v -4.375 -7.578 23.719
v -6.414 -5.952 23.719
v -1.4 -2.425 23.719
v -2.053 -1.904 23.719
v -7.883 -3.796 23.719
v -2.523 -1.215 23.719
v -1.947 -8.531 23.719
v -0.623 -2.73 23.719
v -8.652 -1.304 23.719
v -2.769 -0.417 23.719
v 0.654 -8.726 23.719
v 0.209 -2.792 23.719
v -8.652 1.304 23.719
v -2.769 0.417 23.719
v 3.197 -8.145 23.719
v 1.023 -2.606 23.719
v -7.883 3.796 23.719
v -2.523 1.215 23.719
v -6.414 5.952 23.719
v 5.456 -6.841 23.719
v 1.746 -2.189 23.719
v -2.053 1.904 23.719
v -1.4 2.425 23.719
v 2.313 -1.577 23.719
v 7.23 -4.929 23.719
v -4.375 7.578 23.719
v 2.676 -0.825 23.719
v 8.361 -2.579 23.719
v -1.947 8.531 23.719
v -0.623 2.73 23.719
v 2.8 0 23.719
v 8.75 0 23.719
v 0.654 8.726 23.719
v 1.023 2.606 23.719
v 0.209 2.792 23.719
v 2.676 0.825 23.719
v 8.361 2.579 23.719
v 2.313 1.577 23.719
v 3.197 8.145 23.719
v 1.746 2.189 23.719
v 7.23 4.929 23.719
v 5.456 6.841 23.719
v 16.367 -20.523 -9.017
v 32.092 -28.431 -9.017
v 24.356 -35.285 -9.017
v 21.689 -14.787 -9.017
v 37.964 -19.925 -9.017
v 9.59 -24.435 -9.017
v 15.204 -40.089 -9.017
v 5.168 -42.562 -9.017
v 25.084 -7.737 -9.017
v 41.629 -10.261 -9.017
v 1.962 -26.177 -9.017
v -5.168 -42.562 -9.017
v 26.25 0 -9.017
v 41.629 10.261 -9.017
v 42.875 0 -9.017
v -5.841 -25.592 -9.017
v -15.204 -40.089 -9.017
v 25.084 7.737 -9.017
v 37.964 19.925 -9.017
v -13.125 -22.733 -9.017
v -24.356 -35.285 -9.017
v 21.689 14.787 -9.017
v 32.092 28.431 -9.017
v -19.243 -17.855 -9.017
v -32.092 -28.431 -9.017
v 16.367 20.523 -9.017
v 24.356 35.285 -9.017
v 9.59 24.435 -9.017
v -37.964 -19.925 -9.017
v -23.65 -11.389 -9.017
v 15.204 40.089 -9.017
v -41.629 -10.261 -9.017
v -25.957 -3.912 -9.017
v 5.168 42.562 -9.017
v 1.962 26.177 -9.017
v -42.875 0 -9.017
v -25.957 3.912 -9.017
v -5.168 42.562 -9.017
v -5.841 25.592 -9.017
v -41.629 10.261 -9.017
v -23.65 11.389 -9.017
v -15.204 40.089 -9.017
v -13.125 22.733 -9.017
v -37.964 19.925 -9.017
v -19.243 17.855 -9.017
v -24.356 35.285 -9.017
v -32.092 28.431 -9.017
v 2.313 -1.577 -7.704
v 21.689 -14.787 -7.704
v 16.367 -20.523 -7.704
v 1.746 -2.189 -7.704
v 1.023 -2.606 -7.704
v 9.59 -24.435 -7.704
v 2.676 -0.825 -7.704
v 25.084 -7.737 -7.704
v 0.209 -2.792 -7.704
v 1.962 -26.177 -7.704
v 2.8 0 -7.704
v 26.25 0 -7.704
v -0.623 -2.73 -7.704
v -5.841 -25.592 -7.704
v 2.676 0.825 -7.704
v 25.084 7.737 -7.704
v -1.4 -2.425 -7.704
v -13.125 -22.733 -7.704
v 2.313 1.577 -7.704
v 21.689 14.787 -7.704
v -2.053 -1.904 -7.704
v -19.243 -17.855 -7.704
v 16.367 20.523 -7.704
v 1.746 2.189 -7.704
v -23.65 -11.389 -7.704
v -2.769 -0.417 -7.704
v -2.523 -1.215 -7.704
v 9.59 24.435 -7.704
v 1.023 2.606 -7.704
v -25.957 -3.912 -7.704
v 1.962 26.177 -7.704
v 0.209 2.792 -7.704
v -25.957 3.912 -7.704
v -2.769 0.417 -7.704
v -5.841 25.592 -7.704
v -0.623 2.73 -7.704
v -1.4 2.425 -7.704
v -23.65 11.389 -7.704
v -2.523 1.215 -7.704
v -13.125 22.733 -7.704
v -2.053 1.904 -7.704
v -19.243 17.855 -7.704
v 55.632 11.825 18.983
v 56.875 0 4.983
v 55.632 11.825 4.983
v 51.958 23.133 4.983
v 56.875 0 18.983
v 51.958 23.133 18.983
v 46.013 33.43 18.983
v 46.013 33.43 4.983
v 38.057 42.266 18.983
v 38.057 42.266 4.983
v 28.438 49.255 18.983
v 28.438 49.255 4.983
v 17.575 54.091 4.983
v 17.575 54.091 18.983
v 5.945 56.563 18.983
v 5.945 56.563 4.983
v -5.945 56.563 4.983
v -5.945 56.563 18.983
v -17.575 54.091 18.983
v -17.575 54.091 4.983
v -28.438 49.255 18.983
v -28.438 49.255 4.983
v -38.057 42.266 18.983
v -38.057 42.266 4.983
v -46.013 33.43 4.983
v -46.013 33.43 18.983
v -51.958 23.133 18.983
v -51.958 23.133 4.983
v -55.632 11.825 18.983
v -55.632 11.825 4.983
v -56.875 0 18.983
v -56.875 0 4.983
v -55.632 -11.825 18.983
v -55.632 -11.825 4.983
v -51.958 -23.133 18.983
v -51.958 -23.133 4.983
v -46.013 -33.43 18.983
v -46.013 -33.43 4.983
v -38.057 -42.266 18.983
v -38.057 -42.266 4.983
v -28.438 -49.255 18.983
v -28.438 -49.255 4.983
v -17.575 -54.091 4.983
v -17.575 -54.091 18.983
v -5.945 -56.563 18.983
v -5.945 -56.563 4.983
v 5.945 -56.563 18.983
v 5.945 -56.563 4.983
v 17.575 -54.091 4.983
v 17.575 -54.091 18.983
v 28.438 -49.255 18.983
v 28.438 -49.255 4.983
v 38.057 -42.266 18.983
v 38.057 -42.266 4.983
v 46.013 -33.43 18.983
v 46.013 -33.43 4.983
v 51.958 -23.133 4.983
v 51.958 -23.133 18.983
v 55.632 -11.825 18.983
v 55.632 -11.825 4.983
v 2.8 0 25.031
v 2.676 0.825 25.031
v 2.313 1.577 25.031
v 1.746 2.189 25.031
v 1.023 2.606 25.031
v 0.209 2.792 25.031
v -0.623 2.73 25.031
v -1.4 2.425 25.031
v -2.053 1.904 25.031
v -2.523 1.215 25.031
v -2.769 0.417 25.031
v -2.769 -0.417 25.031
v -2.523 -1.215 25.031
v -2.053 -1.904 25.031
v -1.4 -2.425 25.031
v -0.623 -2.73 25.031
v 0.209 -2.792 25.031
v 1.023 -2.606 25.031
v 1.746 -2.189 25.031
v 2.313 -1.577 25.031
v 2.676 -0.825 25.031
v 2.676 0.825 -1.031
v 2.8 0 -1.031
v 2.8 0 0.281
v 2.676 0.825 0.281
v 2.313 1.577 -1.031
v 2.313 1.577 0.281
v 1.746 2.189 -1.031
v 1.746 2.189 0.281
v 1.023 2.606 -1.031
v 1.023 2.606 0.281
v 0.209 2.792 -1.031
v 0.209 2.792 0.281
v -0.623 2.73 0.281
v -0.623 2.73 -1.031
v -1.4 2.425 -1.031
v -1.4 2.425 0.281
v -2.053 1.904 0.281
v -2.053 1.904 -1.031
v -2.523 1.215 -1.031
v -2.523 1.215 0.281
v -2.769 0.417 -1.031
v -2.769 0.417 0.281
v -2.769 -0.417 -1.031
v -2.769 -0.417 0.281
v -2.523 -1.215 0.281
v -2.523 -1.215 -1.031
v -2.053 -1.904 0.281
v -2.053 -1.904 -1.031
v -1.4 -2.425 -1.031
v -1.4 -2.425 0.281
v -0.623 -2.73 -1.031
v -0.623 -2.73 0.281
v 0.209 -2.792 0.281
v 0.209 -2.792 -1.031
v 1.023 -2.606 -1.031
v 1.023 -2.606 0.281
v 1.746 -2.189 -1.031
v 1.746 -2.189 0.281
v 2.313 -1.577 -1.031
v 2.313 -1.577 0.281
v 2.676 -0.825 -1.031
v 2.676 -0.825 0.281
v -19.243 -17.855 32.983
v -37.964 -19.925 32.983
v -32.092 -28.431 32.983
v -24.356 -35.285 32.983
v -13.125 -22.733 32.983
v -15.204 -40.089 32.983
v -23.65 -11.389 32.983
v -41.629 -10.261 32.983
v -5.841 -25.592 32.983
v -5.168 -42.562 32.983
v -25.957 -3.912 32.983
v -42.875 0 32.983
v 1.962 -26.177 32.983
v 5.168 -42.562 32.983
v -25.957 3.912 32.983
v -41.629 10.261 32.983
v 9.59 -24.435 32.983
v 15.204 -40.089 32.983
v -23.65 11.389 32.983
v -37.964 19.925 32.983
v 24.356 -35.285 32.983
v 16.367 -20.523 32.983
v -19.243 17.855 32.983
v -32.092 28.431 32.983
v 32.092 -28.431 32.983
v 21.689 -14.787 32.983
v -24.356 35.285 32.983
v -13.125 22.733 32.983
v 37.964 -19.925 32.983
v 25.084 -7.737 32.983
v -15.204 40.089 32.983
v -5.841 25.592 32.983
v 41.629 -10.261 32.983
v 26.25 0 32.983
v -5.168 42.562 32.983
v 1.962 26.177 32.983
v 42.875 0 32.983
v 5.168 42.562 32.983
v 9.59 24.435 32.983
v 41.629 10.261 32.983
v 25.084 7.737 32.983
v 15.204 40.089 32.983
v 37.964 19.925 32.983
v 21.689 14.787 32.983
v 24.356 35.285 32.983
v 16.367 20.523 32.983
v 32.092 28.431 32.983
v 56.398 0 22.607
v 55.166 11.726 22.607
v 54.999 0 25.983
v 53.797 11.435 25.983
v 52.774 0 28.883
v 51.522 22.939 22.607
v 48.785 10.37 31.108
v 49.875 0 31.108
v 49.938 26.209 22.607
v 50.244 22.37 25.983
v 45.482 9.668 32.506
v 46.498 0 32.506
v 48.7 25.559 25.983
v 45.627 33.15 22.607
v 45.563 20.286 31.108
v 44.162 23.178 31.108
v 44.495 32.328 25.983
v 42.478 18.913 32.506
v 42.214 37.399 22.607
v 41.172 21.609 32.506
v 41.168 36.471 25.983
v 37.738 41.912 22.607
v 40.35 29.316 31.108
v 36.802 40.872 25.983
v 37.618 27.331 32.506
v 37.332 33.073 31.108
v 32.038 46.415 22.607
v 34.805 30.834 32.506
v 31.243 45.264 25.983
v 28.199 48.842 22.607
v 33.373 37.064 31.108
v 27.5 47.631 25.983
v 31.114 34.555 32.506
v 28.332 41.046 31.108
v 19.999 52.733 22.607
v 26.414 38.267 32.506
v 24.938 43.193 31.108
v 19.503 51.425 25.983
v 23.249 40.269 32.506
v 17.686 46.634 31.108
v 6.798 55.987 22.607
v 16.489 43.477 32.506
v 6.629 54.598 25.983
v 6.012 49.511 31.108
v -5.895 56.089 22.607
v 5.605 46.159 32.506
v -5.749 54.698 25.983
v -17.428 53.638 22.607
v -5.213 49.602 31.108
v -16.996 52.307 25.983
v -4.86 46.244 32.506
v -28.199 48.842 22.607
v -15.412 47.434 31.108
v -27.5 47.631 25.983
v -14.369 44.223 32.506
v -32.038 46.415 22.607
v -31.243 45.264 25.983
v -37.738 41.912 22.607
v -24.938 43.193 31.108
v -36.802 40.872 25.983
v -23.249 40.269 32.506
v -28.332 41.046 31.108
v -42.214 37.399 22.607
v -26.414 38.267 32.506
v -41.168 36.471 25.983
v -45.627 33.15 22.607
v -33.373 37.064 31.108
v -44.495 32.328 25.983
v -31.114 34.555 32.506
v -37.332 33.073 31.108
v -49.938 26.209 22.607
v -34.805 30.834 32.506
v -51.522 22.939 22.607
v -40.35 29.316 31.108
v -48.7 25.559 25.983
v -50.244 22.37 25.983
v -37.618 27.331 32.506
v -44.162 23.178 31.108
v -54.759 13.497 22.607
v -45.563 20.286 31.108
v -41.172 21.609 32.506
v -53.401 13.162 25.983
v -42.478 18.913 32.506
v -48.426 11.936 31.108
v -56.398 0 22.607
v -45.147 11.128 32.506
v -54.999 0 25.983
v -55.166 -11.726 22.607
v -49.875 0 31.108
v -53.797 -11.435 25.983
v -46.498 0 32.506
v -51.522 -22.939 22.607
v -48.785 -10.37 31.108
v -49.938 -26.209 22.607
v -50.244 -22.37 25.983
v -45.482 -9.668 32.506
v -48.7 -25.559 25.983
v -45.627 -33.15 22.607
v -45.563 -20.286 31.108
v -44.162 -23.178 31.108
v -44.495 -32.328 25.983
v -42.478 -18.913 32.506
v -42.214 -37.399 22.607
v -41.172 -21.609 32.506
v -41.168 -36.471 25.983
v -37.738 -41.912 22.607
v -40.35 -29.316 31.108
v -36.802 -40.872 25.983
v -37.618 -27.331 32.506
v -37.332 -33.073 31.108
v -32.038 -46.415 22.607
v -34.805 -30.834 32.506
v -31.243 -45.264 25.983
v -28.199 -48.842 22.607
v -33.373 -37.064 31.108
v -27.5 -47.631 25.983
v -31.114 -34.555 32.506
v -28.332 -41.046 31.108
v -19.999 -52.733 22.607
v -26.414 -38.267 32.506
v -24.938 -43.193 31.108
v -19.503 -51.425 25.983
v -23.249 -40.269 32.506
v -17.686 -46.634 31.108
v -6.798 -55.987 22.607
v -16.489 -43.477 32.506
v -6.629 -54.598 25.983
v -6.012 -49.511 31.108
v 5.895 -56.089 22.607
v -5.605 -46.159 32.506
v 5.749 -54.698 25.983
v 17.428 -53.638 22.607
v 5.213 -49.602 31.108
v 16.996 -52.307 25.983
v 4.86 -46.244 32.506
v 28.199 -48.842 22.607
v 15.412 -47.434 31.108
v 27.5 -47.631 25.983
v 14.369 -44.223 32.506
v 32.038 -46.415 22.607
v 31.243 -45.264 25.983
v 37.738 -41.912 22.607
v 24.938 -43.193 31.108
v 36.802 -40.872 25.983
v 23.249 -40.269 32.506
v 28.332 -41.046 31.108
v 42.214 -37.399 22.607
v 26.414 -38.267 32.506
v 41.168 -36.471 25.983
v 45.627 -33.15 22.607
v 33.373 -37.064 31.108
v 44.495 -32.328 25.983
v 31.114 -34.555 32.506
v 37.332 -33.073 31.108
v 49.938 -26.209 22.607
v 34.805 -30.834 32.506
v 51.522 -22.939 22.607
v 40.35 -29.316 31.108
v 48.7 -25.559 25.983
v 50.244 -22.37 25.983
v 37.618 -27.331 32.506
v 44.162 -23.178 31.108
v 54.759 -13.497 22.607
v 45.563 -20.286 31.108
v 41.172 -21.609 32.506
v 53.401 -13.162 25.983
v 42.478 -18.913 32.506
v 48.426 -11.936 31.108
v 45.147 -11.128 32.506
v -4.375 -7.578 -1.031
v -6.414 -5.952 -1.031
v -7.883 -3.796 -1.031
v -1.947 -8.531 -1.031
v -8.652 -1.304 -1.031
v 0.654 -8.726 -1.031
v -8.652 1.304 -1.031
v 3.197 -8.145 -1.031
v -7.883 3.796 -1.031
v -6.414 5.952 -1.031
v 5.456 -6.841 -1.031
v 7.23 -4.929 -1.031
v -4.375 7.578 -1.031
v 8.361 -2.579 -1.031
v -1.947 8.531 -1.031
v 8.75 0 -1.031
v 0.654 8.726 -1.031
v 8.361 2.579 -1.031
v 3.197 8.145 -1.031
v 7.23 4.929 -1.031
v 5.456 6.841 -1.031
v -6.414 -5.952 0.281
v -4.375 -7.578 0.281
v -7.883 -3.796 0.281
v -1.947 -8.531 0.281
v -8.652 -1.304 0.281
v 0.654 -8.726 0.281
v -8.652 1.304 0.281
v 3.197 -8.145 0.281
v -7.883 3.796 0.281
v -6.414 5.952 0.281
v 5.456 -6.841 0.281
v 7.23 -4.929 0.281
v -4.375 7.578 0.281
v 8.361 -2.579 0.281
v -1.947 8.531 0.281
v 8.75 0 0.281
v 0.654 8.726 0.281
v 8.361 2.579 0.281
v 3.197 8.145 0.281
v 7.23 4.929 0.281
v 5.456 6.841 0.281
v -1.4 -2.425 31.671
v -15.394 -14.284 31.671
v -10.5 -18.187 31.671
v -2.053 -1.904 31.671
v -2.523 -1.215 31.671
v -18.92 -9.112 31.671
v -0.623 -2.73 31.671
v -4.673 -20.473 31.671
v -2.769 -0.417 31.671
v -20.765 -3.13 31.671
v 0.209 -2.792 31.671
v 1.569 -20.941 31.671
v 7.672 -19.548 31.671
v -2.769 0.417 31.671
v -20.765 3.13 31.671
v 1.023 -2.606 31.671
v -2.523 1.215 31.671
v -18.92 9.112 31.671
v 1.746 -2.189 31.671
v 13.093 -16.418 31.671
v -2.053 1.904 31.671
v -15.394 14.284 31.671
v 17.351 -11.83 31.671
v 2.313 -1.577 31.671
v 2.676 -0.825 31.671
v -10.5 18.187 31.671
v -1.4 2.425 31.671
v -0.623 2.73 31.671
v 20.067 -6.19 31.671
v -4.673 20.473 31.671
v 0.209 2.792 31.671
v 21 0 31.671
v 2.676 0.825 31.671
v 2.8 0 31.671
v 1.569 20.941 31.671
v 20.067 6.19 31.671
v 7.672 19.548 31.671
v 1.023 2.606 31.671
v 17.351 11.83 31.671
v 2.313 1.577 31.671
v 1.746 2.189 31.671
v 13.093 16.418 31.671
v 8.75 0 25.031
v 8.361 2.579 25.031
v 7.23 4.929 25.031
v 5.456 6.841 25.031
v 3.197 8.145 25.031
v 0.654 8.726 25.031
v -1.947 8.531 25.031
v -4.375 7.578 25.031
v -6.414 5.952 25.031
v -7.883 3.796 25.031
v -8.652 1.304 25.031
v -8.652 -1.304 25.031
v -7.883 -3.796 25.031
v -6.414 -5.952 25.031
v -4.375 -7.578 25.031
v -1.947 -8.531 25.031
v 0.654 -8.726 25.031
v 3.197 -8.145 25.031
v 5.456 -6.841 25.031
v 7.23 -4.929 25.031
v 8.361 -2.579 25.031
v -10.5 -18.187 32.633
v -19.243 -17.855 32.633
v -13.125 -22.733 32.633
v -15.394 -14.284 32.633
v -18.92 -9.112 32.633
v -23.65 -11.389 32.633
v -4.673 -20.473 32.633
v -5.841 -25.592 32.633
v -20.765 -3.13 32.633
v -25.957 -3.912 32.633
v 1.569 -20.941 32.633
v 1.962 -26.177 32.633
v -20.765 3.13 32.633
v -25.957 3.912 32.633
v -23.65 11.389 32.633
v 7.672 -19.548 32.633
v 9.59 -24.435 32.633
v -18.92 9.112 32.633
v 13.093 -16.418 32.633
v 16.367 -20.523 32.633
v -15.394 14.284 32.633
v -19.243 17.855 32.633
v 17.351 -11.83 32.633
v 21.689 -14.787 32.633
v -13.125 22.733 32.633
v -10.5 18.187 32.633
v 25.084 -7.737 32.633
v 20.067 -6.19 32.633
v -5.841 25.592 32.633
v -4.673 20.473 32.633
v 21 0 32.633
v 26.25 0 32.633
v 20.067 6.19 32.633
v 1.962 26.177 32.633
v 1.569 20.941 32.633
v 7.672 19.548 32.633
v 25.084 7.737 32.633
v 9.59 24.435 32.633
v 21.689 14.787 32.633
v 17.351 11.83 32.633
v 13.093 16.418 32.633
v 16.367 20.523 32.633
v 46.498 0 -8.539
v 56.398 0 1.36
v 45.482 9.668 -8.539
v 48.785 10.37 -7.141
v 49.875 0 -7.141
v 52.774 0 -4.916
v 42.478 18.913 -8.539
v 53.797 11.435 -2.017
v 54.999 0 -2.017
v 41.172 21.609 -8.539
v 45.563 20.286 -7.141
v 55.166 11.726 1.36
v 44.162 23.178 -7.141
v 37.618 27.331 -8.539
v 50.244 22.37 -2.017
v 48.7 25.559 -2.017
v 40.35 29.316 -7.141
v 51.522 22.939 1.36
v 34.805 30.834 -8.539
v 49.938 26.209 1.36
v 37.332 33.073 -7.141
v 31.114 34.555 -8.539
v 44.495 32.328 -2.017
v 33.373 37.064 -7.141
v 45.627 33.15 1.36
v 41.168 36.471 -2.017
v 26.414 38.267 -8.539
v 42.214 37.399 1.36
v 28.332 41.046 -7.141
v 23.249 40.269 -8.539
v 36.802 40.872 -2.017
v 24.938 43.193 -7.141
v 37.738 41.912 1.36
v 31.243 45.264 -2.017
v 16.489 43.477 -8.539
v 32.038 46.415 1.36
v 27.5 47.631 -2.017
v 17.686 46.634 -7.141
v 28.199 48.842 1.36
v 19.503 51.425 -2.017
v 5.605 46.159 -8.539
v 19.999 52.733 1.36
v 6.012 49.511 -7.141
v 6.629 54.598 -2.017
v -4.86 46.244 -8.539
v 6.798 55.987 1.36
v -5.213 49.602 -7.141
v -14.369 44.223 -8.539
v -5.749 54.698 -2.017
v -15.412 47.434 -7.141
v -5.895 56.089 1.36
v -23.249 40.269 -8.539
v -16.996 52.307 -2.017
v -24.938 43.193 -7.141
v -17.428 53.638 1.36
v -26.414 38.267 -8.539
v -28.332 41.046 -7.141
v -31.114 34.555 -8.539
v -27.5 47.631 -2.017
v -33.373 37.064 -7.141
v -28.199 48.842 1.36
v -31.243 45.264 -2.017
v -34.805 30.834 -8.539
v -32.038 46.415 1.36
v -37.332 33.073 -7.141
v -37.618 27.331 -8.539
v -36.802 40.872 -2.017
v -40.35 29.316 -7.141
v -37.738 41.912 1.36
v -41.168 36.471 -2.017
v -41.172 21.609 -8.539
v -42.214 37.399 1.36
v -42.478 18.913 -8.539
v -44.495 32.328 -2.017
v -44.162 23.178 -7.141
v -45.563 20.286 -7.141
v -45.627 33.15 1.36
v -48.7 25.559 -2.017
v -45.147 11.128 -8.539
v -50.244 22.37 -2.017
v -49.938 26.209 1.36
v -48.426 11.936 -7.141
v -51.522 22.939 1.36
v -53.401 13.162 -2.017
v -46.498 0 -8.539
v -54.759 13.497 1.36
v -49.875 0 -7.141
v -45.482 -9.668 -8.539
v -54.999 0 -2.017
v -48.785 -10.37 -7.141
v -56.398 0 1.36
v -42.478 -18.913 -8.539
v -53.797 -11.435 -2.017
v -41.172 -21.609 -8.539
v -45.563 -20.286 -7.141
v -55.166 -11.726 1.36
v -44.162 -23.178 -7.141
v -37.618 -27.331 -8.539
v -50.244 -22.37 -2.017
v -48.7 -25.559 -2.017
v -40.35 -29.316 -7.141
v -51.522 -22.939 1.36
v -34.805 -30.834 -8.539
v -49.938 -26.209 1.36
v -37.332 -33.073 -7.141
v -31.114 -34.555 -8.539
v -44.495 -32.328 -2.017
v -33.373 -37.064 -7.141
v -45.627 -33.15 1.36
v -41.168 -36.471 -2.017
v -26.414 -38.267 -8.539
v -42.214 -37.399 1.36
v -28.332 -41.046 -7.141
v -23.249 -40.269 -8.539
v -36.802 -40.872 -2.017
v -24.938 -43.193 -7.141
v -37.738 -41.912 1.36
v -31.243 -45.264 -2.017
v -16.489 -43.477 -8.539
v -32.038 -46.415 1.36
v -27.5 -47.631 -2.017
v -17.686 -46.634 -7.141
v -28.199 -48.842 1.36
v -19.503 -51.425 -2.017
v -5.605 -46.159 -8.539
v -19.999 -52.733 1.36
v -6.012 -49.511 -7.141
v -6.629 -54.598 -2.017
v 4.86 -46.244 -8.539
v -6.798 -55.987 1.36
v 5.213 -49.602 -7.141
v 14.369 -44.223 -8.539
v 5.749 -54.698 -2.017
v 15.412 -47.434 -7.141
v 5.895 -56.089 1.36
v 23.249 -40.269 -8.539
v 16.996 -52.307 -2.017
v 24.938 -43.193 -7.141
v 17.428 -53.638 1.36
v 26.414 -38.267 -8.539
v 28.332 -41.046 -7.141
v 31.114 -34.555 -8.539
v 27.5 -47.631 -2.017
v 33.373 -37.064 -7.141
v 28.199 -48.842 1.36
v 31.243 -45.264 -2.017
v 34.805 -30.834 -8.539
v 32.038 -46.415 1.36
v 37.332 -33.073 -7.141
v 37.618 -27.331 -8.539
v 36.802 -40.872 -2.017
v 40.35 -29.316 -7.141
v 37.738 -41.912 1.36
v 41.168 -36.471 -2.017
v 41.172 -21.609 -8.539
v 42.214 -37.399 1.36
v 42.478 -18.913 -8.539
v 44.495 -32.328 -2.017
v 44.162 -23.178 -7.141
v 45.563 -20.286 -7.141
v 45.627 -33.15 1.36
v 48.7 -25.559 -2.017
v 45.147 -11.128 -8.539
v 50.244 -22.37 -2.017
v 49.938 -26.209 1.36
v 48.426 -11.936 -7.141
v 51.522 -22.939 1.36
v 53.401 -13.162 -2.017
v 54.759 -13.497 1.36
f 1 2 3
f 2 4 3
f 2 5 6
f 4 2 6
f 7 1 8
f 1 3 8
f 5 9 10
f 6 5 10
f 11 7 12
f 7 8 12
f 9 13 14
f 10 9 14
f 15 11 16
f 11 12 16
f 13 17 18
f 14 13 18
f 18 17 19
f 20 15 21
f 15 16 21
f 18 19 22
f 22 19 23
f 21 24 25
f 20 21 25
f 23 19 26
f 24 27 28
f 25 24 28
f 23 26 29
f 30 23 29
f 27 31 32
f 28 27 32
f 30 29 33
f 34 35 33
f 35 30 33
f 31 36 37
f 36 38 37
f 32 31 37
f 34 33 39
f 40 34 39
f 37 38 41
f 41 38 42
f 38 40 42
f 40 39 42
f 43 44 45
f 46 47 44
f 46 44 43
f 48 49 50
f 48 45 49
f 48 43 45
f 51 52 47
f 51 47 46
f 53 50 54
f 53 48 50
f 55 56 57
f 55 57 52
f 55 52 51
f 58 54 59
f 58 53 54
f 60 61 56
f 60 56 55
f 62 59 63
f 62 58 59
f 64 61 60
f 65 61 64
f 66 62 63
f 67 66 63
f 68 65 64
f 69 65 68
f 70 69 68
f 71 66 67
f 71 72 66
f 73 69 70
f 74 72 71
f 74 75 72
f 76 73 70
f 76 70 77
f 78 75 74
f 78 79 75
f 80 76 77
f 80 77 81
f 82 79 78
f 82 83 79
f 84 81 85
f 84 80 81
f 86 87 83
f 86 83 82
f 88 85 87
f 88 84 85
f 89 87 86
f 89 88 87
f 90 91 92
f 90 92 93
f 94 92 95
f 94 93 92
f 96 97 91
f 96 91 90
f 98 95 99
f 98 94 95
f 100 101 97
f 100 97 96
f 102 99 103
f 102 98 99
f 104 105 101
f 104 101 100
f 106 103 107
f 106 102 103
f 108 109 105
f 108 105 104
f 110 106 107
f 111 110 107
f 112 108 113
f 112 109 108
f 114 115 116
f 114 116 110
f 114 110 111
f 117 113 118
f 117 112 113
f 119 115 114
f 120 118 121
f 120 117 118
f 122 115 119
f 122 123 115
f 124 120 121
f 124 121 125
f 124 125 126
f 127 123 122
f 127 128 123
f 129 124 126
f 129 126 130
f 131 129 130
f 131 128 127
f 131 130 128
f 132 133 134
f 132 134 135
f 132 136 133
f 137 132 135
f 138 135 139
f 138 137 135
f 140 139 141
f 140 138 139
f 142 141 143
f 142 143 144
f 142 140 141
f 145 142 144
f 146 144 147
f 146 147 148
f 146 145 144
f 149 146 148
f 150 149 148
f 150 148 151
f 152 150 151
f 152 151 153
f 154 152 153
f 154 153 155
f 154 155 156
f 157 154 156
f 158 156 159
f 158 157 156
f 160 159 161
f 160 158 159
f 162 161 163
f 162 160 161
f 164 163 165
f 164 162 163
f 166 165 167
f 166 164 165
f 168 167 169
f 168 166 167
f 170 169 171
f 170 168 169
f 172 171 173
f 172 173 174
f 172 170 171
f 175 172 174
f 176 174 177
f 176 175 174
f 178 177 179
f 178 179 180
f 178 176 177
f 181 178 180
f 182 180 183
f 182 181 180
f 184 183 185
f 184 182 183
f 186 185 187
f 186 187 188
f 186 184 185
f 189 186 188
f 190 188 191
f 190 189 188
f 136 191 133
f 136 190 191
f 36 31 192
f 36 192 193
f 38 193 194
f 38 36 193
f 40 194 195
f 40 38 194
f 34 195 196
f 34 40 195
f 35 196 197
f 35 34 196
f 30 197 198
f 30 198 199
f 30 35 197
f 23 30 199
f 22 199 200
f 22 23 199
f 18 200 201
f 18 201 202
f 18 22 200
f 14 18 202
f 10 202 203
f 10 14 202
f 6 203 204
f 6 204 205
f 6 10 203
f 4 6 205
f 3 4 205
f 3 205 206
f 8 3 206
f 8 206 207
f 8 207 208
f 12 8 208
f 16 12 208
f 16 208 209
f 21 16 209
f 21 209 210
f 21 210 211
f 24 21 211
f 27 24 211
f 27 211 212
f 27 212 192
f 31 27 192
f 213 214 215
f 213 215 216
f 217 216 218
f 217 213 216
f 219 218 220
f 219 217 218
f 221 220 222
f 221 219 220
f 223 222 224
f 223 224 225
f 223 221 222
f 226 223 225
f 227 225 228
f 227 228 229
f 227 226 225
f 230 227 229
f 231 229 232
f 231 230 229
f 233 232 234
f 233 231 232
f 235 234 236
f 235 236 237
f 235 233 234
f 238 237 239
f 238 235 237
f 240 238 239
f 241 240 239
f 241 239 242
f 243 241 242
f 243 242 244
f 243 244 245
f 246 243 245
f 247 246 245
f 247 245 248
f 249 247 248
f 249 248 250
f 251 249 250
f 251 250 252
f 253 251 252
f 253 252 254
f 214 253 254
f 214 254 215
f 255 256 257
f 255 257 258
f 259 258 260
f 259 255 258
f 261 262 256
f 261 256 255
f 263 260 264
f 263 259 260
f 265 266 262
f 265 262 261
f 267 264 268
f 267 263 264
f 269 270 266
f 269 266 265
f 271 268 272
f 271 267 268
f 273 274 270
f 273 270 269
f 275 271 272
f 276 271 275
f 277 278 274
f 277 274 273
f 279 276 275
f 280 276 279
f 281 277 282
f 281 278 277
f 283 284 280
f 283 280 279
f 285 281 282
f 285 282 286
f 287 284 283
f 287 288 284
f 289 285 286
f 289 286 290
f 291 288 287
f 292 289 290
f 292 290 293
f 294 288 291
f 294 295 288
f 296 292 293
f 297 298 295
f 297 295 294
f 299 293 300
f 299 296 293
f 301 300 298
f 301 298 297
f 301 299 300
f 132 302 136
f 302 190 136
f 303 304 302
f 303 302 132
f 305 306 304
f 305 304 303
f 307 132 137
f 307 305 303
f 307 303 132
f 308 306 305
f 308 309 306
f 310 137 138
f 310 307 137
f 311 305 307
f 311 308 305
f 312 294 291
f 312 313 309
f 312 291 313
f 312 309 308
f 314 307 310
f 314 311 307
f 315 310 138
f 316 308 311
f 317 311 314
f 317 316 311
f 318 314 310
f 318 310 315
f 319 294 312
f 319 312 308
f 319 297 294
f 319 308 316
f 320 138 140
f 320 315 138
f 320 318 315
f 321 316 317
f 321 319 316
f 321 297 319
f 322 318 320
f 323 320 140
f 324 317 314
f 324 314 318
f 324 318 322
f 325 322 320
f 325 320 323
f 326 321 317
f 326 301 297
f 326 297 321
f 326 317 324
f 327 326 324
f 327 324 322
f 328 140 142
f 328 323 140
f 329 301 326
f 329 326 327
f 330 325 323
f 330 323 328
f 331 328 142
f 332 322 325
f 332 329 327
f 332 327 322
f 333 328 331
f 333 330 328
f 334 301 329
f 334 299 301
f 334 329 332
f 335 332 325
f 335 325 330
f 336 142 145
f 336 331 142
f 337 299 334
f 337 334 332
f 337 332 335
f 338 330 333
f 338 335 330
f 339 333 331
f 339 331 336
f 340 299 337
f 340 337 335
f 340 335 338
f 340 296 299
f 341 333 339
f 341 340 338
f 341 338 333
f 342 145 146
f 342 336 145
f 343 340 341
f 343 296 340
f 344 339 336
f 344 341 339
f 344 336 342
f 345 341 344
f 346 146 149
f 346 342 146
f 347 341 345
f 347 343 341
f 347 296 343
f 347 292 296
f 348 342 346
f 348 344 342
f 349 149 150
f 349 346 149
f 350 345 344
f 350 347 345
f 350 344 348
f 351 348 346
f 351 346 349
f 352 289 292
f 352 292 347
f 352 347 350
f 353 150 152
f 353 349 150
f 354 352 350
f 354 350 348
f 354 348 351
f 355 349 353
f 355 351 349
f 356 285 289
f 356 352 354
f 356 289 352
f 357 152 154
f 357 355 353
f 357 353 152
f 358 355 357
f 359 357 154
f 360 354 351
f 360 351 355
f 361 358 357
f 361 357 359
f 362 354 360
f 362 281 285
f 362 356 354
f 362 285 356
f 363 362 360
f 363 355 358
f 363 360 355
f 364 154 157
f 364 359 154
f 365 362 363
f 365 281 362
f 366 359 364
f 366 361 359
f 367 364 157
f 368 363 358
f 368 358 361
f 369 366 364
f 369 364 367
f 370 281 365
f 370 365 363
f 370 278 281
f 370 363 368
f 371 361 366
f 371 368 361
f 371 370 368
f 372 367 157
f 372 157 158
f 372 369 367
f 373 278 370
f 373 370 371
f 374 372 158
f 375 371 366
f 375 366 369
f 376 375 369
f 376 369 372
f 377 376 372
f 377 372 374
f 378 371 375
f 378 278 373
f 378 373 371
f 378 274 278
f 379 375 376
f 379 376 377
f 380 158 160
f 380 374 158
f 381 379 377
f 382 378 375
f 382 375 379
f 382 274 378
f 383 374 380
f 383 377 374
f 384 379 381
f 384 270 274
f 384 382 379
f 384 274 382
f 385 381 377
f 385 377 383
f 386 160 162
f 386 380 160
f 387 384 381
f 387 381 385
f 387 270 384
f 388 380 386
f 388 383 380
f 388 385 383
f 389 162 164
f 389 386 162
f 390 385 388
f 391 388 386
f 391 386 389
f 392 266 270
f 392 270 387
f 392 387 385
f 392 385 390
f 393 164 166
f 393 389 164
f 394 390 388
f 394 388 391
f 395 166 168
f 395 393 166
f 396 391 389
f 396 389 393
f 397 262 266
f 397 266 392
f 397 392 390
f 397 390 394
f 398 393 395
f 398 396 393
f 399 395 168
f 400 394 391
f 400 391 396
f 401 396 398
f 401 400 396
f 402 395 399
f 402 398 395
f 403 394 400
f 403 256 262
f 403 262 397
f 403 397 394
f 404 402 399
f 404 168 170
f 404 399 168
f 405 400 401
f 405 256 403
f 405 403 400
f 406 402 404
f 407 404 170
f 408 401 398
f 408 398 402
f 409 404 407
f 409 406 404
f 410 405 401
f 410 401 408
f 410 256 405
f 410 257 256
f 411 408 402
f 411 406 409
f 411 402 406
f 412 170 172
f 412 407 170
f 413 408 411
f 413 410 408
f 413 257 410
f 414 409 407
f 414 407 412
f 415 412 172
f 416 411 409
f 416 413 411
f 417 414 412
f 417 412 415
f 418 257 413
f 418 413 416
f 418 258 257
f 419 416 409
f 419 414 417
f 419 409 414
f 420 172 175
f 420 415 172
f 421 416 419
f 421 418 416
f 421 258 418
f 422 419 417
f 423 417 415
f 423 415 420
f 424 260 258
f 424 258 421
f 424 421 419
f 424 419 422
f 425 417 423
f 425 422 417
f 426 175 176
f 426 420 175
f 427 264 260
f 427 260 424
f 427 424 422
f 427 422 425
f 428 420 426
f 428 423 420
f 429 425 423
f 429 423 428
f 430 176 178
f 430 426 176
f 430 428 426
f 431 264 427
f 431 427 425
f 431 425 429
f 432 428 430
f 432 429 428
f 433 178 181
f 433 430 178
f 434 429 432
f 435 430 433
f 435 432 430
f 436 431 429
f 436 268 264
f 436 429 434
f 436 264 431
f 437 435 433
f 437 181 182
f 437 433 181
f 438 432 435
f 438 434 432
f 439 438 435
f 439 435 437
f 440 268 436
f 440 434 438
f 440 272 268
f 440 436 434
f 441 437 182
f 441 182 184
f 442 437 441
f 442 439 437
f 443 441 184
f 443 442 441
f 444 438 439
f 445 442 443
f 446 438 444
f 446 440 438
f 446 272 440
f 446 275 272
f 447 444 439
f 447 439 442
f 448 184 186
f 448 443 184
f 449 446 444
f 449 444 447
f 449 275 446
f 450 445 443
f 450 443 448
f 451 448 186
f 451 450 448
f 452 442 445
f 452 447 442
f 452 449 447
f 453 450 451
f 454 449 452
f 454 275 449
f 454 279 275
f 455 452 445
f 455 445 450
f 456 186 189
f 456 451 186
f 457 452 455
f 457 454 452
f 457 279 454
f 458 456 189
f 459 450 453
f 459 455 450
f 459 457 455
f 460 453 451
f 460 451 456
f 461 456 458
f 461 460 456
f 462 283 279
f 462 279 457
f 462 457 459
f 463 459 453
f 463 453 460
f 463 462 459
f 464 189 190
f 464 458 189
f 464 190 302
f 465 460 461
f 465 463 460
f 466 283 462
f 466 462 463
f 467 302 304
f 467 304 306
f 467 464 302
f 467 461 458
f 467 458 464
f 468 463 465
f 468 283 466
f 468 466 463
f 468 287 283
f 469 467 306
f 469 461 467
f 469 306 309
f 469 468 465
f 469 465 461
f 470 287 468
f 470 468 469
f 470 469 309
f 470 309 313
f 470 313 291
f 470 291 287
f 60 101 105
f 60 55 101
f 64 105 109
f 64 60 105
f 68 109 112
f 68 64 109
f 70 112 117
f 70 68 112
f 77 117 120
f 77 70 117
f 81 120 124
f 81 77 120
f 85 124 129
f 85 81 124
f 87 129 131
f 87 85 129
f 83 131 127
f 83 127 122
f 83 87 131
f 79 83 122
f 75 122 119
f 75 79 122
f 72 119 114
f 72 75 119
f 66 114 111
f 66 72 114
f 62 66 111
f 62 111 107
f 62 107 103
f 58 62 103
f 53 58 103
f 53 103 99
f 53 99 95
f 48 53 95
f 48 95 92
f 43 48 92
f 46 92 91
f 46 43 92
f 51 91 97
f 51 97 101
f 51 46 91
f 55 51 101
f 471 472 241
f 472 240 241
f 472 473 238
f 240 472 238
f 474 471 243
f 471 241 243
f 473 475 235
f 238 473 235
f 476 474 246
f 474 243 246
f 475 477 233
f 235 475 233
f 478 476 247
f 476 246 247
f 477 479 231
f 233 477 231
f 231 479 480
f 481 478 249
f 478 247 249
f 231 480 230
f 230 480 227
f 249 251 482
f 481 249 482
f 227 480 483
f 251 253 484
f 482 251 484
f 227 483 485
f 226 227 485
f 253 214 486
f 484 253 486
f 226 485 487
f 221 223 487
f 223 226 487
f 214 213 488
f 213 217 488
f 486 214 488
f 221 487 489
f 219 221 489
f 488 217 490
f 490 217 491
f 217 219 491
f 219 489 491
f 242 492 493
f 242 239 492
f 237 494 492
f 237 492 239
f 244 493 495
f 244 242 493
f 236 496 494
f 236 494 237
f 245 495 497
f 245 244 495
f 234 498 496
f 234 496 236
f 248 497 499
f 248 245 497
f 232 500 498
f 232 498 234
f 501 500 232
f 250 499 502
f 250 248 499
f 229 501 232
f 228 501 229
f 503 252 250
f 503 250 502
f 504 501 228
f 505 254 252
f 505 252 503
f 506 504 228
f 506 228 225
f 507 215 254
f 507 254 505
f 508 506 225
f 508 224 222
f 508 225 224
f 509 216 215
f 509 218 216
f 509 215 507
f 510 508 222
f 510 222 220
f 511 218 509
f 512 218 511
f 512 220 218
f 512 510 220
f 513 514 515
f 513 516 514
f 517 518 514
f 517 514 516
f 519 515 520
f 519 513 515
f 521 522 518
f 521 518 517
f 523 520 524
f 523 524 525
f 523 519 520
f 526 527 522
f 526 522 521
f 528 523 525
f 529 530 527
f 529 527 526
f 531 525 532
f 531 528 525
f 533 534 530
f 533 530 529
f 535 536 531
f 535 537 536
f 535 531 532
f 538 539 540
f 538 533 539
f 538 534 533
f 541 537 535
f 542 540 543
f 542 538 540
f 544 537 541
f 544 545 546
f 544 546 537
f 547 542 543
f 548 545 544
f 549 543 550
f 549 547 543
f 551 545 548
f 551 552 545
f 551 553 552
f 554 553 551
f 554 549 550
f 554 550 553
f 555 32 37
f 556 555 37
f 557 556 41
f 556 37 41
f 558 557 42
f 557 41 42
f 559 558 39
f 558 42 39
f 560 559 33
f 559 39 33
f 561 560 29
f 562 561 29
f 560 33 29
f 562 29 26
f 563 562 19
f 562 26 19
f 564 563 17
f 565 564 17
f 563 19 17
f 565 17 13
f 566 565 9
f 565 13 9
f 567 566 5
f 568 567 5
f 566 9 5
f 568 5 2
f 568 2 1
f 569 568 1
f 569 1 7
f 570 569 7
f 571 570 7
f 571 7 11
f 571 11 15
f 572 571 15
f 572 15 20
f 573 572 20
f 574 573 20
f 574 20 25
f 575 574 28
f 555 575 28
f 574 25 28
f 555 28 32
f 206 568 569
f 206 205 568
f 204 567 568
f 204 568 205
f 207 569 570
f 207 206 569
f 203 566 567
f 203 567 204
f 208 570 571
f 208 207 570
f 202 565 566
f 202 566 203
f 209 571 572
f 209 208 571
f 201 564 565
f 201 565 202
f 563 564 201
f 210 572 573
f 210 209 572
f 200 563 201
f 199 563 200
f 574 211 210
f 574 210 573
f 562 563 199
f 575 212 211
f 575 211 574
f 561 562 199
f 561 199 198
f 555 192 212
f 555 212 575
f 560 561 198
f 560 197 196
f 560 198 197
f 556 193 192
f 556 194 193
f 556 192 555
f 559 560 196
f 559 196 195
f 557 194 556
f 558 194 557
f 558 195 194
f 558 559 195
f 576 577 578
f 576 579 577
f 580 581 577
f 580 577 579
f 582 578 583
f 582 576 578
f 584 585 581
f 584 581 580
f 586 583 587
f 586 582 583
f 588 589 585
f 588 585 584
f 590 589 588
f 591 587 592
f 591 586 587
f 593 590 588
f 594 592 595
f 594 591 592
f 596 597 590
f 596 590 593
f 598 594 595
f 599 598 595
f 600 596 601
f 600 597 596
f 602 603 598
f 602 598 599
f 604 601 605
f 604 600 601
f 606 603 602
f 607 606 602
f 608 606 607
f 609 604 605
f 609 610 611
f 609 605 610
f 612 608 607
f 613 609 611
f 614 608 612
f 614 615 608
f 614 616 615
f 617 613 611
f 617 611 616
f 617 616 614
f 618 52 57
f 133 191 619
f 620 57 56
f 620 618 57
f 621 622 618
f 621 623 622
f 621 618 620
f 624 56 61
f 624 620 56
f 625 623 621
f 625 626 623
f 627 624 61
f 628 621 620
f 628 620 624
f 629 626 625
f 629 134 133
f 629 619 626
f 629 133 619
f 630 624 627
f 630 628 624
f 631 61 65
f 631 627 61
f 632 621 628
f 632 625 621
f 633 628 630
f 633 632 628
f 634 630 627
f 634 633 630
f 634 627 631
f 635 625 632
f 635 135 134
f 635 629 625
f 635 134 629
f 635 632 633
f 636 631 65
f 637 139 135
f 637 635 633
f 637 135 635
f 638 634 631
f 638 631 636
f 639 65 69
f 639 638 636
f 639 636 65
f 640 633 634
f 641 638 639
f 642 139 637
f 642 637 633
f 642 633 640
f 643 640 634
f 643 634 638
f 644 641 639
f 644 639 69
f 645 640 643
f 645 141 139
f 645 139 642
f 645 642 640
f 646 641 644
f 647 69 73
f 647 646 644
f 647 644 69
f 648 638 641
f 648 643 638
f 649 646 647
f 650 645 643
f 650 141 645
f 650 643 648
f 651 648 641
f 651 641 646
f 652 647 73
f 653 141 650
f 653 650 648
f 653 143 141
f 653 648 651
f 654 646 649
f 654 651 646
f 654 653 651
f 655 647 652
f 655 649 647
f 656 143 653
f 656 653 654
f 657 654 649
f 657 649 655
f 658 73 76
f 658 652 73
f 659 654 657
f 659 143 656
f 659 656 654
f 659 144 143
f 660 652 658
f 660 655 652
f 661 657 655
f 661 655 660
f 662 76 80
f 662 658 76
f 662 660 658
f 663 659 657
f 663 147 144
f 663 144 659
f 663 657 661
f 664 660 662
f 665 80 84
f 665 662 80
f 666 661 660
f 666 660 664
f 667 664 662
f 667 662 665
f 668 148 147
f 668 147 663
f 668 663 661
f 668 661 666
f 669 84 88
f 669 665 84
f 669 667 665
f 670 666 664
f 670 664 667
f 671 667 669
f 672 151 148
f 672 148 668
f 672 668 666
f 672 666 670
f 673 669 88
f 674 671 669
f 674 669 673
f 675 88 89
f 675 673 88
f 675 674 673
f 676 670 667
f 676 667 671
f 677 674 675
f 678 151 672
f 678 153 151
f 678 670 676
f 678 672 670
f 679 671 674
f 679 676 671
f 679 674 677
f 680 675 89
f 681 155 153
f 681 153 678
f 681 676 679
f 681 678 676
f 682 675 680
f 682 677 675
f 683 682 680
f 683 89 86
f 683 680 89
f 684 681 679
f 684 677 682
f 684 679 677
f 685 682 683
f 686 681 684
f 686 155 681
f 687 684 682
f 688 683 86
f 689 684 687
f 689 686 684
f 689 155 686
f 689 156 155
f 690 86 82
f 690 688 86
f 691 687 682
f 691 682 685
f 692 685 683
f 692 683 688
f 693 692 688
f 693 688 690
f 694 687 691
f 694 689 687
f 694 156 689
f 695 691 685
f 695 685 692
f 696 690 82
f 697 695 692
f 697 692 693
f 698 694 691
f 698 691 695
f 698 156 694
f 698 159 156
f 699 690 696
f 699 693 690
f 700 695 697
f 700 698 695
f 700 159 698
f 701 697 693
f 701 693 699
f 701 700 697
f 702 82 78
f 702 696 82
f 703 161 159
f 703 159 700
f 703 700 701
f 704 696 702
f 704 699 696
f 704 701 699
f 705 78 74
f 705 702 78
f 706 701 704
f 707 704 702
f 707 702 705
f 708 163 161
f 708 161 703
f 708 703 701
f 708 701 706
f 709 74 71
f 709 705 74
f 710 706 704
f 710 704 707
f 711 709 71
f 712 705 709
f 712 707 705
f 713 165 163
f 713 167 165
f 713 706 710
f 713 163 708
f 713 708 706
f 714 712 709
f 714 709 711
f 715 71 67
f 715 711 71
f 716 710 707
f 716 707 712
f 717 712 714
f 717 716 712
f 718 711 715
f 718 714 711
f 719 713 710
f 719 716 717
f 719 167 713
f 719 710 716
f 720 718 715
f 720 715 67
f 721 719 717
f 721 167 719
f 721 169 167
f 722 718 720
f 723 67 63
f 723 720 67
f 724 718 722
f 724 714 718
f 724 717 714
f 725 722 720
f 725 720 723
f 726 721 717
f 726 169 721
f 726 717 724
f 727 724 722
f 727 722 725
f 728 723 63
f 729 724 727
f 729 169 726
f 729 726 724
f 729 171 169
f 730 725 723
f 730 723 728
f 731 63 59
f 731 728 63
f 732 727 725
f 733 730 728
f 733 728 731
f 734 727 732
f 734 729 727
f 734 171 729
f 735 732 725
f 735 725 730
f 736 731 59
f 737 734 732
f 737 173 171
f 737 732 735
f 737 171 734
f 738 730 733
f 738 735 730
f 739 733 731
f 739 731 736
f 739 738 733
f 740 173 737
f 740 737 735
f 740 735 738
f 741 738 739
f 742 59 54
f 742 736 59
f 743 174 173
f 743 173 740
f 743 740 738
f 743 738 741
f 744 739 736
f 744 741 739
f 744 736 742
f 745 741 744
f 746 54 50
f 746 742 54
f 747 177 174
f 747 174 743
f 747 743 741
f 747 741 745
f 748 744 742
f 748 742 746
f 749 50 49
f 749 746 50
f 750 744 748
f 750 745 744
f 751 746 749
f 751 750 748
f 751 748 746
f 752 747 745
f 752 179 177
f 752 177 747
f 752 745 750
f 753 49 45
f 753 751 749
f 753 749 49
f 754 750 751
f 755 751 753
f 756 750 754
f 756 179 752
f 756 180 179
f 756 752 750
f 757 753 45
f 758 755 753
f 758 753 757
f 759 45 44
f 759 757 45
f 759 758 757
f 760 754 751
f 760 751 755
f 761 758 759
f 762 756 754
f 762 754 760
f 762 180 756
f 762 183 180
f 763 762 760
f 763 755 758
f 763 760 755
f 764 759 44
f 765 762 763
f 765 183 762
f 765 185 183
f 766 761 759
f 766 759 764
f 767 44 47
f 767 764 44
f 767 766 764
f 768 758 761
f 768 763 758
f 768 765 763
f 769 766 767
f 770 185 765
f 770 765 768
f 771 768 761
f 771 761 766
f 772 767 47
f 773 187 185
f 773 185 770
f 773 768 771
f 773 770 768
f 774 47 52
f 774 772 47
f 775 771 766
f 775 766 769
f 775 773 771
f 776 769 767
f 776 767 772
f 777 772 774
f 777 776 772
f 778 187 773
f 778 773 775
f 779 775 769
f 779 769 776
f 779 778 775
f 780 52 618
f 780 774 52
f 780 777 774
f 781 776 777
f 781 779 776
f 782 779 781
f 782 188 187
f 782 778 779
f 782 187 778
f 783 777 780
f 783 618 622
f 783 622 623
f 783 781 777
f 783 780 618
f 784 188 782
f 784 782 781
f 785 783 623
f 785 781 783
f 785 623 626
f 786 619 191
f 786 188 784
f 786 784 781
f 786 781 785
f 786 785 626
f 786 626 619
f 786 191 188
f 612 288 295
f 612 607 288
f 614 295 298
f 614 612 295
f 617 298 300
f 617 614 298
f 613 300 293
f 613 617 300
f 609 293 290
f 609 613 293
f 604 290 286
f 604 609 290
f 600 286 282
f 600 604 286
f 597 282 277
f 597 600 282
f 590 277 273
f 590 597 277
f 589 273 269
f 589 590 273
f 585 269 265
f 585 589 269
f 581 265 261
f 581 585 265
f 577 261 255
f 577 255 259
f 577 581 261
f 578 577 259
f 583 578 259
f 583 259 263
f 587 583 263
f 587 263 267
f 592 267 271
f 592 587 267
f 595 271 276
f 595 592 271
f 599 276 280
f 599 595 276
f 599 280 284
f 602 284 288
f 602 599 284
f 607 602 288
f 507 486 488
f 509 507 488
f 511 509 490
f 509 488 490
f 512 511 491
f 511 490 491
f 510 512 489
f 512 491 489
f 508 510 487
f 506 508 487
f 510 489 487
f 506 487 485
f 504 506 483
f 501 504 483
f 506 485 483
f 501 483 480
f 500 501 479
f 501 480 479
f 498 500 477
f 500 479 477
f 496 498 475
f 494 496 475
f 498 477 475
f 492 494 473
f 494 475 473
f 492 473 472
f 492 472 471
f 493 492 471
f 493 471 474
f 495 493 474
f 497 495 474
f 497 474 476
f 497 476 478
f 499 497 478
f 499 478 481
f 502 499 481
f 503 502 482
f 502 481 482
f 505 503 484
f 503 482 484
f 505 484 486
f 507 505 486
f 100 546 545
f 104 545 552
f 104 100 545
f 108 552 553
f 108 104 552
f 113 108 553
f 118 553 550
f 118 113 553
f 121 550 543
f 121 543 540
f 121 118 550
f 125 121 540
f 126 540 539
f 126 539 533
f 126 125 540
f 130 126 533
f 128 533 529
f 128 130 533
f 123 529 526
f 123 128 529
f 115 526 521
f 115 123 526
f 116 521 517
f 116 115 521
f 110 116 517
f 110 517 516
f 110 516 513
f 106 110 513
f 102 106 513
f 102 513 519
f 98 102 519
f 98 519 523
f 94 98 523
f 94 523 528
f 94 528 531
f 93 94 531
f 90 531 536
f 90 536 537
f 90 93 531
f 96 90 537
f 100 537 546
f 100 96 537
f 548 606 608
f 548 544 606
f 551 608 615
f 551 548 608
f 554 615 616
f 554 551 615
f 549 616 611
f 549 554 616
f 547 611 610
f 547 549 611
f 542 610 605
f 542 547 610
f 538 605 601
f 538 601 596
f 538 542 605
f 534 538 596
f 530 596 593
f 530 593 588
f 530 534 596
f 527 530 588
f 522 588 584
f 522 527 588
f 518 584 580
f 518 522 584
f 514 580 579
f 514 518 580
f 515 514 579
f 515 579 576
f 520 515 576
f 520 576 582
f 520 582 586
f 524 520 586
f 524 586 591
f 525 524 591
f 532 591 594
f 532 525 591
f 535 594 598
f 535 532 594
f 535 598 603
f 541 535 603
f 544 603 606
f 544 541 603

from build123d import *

# Parameters (mm, degrees)
SKETCH1_R            = 32.5
SKETCH1_R_2          = 1.6
BOSS_EXTRUDE1_DEPTH  = 24
FILLET2_R            = 8
SKETCH3_R            = 5
BOSS_EXTRUDE2_DEPTH  = 0.75
BOSS_EXTRUDE3_START  = 0.75
SKETCH4_R            = 5
BOSS_EXTRUDE3_DEPTH  = 0.75
SKETCH5_R            = 1.6
CUT_EXTRUDE1_DEPTH   = 40.75
SKETCH6_R            = 15
SKETCH6_R_2          = 12
CUT_EXTRUDE3_DEPTH   = 0.2
CUT_EXTRUDE5_START   = -0.75
SKETCH9_R            = 12
CUT_EXTRUDE5_DEPTH   = 0.75
SKETCH11_R           = 12
CUT_EXTRUDE6_DEPTH   = 0.75
SKETCH12_R           = 15
SKETCH12_R_2         = 12
CUT_EXTRUDE7_DEPTH   = 0.75
SCALE1_START         = 24
SCALE1_OUTLINE_R     = 2.8
SCALE1_OUTLINE_R_2   = 1.6
SCALE1_DEPTH         = 0.75
SCALE1_START_2       = 23.71875
SCALE1_2_OUTLINE_R   = 8.75
SCALE1_2_OUTLINE_R_2 = 2.8
SCALE1_2_DEPTH       = 1.3125
SCALE1_3_OUTLINE_W   = 1.2
SCALE1_3_OUTLINE_H   = 22.5
SCALE1_START_3       = -0.75
SCALE1_5_OUTLINE_R   = 2.8
SCALE1_5_OUTLINE_R_2 = 1.6
SCALE1_5_DEPTH       = 0.75
SCALE1_START_4       = -1.03125
SCALE1_6_OUTLINE_R   = 8.75
SCALE1_6_OUTLINE_R_2 = 2.8
SCALE1_6_DEPTH       = 1.3125


# Read off the part's stored shape, not the designer's step: Scale1
with BuildPart() as part:
    # Sketch1 → Boss-Extrude1 (new body)
    with BuildSketch(Plane.XY):
        Circle(SKETCH1_R)
        Circle(SKETCH1_R_2, mode=Mode.SUBTRACT)
    extrude(amount=BOSS_EXTRUDE1_DEPTH)

    # Fillet2
    fillet2_edges = [part.edges().sort_by_distance(p)[0] for p in [
        (-32.5, 0, 0),
        (-32.5, 0, 24),
    ]]
    fillet(fillet2_edges, radius=FILLET2_R)

    # Sketch3 → Boss-Extrude2 (add)
    with BuildSketch(Plane.XY.offset(24)):
        Circle(SKETCH3_R)
    extrude(amount=BOSS_EXTRUDE2_DEPTH)

    # Sketch4 → Boss-Extrude3 (add)
    with BuildSketch(Plane(origin=(0, 0, 0), x_dir=(-1, 0, 0), z_dir=(0, 0, -1)).offset(BOSS_EXTRUDE3_START)):
        with Locations(Location((0, 0, 0), (0, 0, 180))):
            Circle(SKETCH4_R)
    extrude(amount=-BOSS_EXTRUDE3_DEPTH)

    # Sketch5 → Cut-Extrude1 (cut)
    with BuildSketch(Plane(origin=(0, 0, -0.75), x_dir=(-1, 0, 0), z_dir=(0, 0, -1))):
        Circle(SKETCH5_R)
    extrude(amount=-CUT_EXTRUDE1_DEPTH, mode=Mode.SUBTRACT)

    # Sketch6 → Cut-Extrude3 (cut)
    with BuildSketch(Plane.XY.offset(24)):
        Circle(SKETCH6_R)
        Circle(SKETCH6_R_2, mode=Mode.SUBTRACT)
    extrude(amount=-CUT_EXTRUDE3_DEPTH, mode=Mode.SUBTRACT)

    # Sketch9 → Cut-Extrude5 (cut)
    with BuildSketch(Plane(origin=(0, 0, 0), x_dir=(-1, 0, 0), z_dir=(0, 0, -1)).offset(CUT_EXTRUDE5_START)):
        with Locations(Location((0, 0, 0), (0, 0, 180))):
            Circle(SKETCH9_R)
    extrude(amount=CUT_EXTRUDE5_DEPTH, mode=Mode.SUBTRACT)


with BuildPart() as cut_extrude5_piece_1:
    # of the separate pieces the step leaves, piece 1, a body of its own (cut_extrude5_pieces)
    add(part.part.solids().sort_by_distance((32.5, 0, 8))[0])

    # Sketch11 → Cut-Extrude6 (cut)
    with BuildSketch(Plane.XY.offset(24)):
        with Locations(Location((0, 0, 0), (0, 0, 180))):
            Circle(SKETCH11_R)
    extrude(amount=-CUT_EXTRUDE6_DEPTH, mode=Mode.SUBTRACT)


with BuildPart() as cut_extrude5_piece_2:
    # of the separate pieces the step leaves, piece 2, a body of its own (cut_extrude5_pieces)
    add(part.part.solids().sort_by_distance((5, 0, -0.75))[0])

    # Scale1 5 outline → Scale1 5 (cut)
    with BuildSketch(Plane.XY.offset(SCALE1_START_3)):
        Circle(SCALE1_5_OUTLINE_R)
        Circle(SCALE1_5_OUTLINE_R_2, mode=Mode.SUBTRACT)
    extrude(amount=SCALE1_5_DEPTH, mode=Mode.SUBTRACT)

    # Scale1 6 outline → Scale1 6 (add)
    with BuildSketch(Plane.XY.offset(SCALE1_START_4)):
        Circle(SCALE1_6_OUTLINE_R)
        Circle(SCALE1_6_OUTLINE_R_2, mode=Mode.SUBTRACT)
    extrude(amount=SCALE1_6_DEPTH)


with BuildPart() as cut_extrude6_piece_1:
    # of the separate pieces the step leaves, piece 1, a body of its own (cut_extrude6_pieces)
    add(cut_extrude5_piece_1.part.solids().sort_by_distance((32.5, 0, 8))[0])

    # Sketch12 → Cut-Extrude7 (cut)
    with BuildSketch(Plane(origin=(0, 0, 0), x_dir=(-1, 0, 0), z_dir=(0, 0, -1))):
        with Locations(Location((0, 0, 0), (0, 0, 180))):
            Circle(SKETCH12_R)
        with Locations(Location((0, 0, 0), (0, 0, 180))):
            Circle(SKETCH12_R_2, mode=Mode.SUBTRACT)
    extrude(amount=-CUT_EXTRUDE7_DEPTH, mode=Mode.SUBTRACT)

    # Scale1 3 outline → Scale1 3 (revolve, cut)
    with BuildSketch(Plane.XZ):
        with Locations((2.2, 12)):
            Rectangle(SCALE1_3_OUTLINE_W, SCALE1_3_OUTLINE_H)
    revolve(axis=Axis((0, 0, 0), (0, 0, 1)), mode=Mode.SUBTRACT)

    # Scale1 4 outline → Scale1 4 (revolve)
    with BuildSketch(Plane.XZ):
        with BuildLine():
            Line((2.8, 31.670981604), (2.8, 23.25))
            Line((2.8, 23.25), (12, 23.25))
            Line((12, 23.25), (12, 23.8))
            Line((12, 23.8), (15, 23.8))
            Line((15, 23.8), (15, 24))
            Line((15, 24), (24.5, 24))
            ThreePointArc((24.5, 24), (30.156854249, 21.656854249), (32.5, 16))
            Line((32.5, 16), (32.5, 8))
            ThreePointArc((32.5, 8), (30.156854249, 2.343145751), (24.5, 0))
            Line((24.5, 0), (15, 0))
            Line((15, 0), (15, 0.75))
            Line((15, 0.75), (2.8, 0.75))
            Line((2.8, 0.75), (2.8, -7.704018396))
            Line((2.8, -7.704018396), (26.25, -7.704018396))
            Line((26.25, -7.704018396), (26.25, -9.016518396))
            Line((26.25, -9.016518396), (42.875, -9.016518396))
            ThreePointArc((42.875, -9.016518396), (52.774494937, -4.916013333), (56.875, 4.983481604))
            Line((56.875, 4.983481604), (56.875, 18.983481604))
            ThreePointArc((56.875, 18.983481604), (52.774494937, 28.882976541), (42.875, 32.983481604))
            Line((42.875, 32.983481604), (26.25, 32.983481604))
            Line((26.25, 32.983481604), (26.25, 32.633481604))
            Line((26.25, 32.633481604), (21, 32.633481604))
            Line((21, 32.633481604), (21, 31.670981604))
            Line((21, 31.670981604), (2.8, 31.670981604))
        make_face()
    revolve(axis=Axis((0, 0, 0), (0, 0, 1)))


with BuildPart() as cut_extrude6_piece_2:
    # of the separate pieces the step leaves, piece 2, a body of its own (cut_extrude6_pieces)
    add(cut_extrude5_piece_1.part.solids().sort_by_distance((-1.6, 0, 24))[0])

    # Scale1 outline → Scale1 (cut)
    with BuildSketch(Plane.XY.offset(SCALE1_START)):
        Circle(SCALE1_OUTLINE_R)
        Circle(SCALE1_OUTLINE_R_2, mode=Mode.SUBTRACT)
    extrude(amount=SCALE1_DEPTH, mode=Mode.SUBTRACT)

    # Scale1 2 outline → Scale1 2 (add)
    with BuildSketch(Plane.XY.offset(SCALE1_START_2)):
        Circle(SCALE1_2_OUTLINE_R)
        Circle(SCALE1_2_OUTLINE_R_2, mode=Mode.SUBTRACT)
    extrude(amount=SCALE1_2_DEPTH)


solid = Compound([cut_extrude5_piece_2.part, cut_extrude6_piece_1.part, cut_extrude6_piece_2.part])
